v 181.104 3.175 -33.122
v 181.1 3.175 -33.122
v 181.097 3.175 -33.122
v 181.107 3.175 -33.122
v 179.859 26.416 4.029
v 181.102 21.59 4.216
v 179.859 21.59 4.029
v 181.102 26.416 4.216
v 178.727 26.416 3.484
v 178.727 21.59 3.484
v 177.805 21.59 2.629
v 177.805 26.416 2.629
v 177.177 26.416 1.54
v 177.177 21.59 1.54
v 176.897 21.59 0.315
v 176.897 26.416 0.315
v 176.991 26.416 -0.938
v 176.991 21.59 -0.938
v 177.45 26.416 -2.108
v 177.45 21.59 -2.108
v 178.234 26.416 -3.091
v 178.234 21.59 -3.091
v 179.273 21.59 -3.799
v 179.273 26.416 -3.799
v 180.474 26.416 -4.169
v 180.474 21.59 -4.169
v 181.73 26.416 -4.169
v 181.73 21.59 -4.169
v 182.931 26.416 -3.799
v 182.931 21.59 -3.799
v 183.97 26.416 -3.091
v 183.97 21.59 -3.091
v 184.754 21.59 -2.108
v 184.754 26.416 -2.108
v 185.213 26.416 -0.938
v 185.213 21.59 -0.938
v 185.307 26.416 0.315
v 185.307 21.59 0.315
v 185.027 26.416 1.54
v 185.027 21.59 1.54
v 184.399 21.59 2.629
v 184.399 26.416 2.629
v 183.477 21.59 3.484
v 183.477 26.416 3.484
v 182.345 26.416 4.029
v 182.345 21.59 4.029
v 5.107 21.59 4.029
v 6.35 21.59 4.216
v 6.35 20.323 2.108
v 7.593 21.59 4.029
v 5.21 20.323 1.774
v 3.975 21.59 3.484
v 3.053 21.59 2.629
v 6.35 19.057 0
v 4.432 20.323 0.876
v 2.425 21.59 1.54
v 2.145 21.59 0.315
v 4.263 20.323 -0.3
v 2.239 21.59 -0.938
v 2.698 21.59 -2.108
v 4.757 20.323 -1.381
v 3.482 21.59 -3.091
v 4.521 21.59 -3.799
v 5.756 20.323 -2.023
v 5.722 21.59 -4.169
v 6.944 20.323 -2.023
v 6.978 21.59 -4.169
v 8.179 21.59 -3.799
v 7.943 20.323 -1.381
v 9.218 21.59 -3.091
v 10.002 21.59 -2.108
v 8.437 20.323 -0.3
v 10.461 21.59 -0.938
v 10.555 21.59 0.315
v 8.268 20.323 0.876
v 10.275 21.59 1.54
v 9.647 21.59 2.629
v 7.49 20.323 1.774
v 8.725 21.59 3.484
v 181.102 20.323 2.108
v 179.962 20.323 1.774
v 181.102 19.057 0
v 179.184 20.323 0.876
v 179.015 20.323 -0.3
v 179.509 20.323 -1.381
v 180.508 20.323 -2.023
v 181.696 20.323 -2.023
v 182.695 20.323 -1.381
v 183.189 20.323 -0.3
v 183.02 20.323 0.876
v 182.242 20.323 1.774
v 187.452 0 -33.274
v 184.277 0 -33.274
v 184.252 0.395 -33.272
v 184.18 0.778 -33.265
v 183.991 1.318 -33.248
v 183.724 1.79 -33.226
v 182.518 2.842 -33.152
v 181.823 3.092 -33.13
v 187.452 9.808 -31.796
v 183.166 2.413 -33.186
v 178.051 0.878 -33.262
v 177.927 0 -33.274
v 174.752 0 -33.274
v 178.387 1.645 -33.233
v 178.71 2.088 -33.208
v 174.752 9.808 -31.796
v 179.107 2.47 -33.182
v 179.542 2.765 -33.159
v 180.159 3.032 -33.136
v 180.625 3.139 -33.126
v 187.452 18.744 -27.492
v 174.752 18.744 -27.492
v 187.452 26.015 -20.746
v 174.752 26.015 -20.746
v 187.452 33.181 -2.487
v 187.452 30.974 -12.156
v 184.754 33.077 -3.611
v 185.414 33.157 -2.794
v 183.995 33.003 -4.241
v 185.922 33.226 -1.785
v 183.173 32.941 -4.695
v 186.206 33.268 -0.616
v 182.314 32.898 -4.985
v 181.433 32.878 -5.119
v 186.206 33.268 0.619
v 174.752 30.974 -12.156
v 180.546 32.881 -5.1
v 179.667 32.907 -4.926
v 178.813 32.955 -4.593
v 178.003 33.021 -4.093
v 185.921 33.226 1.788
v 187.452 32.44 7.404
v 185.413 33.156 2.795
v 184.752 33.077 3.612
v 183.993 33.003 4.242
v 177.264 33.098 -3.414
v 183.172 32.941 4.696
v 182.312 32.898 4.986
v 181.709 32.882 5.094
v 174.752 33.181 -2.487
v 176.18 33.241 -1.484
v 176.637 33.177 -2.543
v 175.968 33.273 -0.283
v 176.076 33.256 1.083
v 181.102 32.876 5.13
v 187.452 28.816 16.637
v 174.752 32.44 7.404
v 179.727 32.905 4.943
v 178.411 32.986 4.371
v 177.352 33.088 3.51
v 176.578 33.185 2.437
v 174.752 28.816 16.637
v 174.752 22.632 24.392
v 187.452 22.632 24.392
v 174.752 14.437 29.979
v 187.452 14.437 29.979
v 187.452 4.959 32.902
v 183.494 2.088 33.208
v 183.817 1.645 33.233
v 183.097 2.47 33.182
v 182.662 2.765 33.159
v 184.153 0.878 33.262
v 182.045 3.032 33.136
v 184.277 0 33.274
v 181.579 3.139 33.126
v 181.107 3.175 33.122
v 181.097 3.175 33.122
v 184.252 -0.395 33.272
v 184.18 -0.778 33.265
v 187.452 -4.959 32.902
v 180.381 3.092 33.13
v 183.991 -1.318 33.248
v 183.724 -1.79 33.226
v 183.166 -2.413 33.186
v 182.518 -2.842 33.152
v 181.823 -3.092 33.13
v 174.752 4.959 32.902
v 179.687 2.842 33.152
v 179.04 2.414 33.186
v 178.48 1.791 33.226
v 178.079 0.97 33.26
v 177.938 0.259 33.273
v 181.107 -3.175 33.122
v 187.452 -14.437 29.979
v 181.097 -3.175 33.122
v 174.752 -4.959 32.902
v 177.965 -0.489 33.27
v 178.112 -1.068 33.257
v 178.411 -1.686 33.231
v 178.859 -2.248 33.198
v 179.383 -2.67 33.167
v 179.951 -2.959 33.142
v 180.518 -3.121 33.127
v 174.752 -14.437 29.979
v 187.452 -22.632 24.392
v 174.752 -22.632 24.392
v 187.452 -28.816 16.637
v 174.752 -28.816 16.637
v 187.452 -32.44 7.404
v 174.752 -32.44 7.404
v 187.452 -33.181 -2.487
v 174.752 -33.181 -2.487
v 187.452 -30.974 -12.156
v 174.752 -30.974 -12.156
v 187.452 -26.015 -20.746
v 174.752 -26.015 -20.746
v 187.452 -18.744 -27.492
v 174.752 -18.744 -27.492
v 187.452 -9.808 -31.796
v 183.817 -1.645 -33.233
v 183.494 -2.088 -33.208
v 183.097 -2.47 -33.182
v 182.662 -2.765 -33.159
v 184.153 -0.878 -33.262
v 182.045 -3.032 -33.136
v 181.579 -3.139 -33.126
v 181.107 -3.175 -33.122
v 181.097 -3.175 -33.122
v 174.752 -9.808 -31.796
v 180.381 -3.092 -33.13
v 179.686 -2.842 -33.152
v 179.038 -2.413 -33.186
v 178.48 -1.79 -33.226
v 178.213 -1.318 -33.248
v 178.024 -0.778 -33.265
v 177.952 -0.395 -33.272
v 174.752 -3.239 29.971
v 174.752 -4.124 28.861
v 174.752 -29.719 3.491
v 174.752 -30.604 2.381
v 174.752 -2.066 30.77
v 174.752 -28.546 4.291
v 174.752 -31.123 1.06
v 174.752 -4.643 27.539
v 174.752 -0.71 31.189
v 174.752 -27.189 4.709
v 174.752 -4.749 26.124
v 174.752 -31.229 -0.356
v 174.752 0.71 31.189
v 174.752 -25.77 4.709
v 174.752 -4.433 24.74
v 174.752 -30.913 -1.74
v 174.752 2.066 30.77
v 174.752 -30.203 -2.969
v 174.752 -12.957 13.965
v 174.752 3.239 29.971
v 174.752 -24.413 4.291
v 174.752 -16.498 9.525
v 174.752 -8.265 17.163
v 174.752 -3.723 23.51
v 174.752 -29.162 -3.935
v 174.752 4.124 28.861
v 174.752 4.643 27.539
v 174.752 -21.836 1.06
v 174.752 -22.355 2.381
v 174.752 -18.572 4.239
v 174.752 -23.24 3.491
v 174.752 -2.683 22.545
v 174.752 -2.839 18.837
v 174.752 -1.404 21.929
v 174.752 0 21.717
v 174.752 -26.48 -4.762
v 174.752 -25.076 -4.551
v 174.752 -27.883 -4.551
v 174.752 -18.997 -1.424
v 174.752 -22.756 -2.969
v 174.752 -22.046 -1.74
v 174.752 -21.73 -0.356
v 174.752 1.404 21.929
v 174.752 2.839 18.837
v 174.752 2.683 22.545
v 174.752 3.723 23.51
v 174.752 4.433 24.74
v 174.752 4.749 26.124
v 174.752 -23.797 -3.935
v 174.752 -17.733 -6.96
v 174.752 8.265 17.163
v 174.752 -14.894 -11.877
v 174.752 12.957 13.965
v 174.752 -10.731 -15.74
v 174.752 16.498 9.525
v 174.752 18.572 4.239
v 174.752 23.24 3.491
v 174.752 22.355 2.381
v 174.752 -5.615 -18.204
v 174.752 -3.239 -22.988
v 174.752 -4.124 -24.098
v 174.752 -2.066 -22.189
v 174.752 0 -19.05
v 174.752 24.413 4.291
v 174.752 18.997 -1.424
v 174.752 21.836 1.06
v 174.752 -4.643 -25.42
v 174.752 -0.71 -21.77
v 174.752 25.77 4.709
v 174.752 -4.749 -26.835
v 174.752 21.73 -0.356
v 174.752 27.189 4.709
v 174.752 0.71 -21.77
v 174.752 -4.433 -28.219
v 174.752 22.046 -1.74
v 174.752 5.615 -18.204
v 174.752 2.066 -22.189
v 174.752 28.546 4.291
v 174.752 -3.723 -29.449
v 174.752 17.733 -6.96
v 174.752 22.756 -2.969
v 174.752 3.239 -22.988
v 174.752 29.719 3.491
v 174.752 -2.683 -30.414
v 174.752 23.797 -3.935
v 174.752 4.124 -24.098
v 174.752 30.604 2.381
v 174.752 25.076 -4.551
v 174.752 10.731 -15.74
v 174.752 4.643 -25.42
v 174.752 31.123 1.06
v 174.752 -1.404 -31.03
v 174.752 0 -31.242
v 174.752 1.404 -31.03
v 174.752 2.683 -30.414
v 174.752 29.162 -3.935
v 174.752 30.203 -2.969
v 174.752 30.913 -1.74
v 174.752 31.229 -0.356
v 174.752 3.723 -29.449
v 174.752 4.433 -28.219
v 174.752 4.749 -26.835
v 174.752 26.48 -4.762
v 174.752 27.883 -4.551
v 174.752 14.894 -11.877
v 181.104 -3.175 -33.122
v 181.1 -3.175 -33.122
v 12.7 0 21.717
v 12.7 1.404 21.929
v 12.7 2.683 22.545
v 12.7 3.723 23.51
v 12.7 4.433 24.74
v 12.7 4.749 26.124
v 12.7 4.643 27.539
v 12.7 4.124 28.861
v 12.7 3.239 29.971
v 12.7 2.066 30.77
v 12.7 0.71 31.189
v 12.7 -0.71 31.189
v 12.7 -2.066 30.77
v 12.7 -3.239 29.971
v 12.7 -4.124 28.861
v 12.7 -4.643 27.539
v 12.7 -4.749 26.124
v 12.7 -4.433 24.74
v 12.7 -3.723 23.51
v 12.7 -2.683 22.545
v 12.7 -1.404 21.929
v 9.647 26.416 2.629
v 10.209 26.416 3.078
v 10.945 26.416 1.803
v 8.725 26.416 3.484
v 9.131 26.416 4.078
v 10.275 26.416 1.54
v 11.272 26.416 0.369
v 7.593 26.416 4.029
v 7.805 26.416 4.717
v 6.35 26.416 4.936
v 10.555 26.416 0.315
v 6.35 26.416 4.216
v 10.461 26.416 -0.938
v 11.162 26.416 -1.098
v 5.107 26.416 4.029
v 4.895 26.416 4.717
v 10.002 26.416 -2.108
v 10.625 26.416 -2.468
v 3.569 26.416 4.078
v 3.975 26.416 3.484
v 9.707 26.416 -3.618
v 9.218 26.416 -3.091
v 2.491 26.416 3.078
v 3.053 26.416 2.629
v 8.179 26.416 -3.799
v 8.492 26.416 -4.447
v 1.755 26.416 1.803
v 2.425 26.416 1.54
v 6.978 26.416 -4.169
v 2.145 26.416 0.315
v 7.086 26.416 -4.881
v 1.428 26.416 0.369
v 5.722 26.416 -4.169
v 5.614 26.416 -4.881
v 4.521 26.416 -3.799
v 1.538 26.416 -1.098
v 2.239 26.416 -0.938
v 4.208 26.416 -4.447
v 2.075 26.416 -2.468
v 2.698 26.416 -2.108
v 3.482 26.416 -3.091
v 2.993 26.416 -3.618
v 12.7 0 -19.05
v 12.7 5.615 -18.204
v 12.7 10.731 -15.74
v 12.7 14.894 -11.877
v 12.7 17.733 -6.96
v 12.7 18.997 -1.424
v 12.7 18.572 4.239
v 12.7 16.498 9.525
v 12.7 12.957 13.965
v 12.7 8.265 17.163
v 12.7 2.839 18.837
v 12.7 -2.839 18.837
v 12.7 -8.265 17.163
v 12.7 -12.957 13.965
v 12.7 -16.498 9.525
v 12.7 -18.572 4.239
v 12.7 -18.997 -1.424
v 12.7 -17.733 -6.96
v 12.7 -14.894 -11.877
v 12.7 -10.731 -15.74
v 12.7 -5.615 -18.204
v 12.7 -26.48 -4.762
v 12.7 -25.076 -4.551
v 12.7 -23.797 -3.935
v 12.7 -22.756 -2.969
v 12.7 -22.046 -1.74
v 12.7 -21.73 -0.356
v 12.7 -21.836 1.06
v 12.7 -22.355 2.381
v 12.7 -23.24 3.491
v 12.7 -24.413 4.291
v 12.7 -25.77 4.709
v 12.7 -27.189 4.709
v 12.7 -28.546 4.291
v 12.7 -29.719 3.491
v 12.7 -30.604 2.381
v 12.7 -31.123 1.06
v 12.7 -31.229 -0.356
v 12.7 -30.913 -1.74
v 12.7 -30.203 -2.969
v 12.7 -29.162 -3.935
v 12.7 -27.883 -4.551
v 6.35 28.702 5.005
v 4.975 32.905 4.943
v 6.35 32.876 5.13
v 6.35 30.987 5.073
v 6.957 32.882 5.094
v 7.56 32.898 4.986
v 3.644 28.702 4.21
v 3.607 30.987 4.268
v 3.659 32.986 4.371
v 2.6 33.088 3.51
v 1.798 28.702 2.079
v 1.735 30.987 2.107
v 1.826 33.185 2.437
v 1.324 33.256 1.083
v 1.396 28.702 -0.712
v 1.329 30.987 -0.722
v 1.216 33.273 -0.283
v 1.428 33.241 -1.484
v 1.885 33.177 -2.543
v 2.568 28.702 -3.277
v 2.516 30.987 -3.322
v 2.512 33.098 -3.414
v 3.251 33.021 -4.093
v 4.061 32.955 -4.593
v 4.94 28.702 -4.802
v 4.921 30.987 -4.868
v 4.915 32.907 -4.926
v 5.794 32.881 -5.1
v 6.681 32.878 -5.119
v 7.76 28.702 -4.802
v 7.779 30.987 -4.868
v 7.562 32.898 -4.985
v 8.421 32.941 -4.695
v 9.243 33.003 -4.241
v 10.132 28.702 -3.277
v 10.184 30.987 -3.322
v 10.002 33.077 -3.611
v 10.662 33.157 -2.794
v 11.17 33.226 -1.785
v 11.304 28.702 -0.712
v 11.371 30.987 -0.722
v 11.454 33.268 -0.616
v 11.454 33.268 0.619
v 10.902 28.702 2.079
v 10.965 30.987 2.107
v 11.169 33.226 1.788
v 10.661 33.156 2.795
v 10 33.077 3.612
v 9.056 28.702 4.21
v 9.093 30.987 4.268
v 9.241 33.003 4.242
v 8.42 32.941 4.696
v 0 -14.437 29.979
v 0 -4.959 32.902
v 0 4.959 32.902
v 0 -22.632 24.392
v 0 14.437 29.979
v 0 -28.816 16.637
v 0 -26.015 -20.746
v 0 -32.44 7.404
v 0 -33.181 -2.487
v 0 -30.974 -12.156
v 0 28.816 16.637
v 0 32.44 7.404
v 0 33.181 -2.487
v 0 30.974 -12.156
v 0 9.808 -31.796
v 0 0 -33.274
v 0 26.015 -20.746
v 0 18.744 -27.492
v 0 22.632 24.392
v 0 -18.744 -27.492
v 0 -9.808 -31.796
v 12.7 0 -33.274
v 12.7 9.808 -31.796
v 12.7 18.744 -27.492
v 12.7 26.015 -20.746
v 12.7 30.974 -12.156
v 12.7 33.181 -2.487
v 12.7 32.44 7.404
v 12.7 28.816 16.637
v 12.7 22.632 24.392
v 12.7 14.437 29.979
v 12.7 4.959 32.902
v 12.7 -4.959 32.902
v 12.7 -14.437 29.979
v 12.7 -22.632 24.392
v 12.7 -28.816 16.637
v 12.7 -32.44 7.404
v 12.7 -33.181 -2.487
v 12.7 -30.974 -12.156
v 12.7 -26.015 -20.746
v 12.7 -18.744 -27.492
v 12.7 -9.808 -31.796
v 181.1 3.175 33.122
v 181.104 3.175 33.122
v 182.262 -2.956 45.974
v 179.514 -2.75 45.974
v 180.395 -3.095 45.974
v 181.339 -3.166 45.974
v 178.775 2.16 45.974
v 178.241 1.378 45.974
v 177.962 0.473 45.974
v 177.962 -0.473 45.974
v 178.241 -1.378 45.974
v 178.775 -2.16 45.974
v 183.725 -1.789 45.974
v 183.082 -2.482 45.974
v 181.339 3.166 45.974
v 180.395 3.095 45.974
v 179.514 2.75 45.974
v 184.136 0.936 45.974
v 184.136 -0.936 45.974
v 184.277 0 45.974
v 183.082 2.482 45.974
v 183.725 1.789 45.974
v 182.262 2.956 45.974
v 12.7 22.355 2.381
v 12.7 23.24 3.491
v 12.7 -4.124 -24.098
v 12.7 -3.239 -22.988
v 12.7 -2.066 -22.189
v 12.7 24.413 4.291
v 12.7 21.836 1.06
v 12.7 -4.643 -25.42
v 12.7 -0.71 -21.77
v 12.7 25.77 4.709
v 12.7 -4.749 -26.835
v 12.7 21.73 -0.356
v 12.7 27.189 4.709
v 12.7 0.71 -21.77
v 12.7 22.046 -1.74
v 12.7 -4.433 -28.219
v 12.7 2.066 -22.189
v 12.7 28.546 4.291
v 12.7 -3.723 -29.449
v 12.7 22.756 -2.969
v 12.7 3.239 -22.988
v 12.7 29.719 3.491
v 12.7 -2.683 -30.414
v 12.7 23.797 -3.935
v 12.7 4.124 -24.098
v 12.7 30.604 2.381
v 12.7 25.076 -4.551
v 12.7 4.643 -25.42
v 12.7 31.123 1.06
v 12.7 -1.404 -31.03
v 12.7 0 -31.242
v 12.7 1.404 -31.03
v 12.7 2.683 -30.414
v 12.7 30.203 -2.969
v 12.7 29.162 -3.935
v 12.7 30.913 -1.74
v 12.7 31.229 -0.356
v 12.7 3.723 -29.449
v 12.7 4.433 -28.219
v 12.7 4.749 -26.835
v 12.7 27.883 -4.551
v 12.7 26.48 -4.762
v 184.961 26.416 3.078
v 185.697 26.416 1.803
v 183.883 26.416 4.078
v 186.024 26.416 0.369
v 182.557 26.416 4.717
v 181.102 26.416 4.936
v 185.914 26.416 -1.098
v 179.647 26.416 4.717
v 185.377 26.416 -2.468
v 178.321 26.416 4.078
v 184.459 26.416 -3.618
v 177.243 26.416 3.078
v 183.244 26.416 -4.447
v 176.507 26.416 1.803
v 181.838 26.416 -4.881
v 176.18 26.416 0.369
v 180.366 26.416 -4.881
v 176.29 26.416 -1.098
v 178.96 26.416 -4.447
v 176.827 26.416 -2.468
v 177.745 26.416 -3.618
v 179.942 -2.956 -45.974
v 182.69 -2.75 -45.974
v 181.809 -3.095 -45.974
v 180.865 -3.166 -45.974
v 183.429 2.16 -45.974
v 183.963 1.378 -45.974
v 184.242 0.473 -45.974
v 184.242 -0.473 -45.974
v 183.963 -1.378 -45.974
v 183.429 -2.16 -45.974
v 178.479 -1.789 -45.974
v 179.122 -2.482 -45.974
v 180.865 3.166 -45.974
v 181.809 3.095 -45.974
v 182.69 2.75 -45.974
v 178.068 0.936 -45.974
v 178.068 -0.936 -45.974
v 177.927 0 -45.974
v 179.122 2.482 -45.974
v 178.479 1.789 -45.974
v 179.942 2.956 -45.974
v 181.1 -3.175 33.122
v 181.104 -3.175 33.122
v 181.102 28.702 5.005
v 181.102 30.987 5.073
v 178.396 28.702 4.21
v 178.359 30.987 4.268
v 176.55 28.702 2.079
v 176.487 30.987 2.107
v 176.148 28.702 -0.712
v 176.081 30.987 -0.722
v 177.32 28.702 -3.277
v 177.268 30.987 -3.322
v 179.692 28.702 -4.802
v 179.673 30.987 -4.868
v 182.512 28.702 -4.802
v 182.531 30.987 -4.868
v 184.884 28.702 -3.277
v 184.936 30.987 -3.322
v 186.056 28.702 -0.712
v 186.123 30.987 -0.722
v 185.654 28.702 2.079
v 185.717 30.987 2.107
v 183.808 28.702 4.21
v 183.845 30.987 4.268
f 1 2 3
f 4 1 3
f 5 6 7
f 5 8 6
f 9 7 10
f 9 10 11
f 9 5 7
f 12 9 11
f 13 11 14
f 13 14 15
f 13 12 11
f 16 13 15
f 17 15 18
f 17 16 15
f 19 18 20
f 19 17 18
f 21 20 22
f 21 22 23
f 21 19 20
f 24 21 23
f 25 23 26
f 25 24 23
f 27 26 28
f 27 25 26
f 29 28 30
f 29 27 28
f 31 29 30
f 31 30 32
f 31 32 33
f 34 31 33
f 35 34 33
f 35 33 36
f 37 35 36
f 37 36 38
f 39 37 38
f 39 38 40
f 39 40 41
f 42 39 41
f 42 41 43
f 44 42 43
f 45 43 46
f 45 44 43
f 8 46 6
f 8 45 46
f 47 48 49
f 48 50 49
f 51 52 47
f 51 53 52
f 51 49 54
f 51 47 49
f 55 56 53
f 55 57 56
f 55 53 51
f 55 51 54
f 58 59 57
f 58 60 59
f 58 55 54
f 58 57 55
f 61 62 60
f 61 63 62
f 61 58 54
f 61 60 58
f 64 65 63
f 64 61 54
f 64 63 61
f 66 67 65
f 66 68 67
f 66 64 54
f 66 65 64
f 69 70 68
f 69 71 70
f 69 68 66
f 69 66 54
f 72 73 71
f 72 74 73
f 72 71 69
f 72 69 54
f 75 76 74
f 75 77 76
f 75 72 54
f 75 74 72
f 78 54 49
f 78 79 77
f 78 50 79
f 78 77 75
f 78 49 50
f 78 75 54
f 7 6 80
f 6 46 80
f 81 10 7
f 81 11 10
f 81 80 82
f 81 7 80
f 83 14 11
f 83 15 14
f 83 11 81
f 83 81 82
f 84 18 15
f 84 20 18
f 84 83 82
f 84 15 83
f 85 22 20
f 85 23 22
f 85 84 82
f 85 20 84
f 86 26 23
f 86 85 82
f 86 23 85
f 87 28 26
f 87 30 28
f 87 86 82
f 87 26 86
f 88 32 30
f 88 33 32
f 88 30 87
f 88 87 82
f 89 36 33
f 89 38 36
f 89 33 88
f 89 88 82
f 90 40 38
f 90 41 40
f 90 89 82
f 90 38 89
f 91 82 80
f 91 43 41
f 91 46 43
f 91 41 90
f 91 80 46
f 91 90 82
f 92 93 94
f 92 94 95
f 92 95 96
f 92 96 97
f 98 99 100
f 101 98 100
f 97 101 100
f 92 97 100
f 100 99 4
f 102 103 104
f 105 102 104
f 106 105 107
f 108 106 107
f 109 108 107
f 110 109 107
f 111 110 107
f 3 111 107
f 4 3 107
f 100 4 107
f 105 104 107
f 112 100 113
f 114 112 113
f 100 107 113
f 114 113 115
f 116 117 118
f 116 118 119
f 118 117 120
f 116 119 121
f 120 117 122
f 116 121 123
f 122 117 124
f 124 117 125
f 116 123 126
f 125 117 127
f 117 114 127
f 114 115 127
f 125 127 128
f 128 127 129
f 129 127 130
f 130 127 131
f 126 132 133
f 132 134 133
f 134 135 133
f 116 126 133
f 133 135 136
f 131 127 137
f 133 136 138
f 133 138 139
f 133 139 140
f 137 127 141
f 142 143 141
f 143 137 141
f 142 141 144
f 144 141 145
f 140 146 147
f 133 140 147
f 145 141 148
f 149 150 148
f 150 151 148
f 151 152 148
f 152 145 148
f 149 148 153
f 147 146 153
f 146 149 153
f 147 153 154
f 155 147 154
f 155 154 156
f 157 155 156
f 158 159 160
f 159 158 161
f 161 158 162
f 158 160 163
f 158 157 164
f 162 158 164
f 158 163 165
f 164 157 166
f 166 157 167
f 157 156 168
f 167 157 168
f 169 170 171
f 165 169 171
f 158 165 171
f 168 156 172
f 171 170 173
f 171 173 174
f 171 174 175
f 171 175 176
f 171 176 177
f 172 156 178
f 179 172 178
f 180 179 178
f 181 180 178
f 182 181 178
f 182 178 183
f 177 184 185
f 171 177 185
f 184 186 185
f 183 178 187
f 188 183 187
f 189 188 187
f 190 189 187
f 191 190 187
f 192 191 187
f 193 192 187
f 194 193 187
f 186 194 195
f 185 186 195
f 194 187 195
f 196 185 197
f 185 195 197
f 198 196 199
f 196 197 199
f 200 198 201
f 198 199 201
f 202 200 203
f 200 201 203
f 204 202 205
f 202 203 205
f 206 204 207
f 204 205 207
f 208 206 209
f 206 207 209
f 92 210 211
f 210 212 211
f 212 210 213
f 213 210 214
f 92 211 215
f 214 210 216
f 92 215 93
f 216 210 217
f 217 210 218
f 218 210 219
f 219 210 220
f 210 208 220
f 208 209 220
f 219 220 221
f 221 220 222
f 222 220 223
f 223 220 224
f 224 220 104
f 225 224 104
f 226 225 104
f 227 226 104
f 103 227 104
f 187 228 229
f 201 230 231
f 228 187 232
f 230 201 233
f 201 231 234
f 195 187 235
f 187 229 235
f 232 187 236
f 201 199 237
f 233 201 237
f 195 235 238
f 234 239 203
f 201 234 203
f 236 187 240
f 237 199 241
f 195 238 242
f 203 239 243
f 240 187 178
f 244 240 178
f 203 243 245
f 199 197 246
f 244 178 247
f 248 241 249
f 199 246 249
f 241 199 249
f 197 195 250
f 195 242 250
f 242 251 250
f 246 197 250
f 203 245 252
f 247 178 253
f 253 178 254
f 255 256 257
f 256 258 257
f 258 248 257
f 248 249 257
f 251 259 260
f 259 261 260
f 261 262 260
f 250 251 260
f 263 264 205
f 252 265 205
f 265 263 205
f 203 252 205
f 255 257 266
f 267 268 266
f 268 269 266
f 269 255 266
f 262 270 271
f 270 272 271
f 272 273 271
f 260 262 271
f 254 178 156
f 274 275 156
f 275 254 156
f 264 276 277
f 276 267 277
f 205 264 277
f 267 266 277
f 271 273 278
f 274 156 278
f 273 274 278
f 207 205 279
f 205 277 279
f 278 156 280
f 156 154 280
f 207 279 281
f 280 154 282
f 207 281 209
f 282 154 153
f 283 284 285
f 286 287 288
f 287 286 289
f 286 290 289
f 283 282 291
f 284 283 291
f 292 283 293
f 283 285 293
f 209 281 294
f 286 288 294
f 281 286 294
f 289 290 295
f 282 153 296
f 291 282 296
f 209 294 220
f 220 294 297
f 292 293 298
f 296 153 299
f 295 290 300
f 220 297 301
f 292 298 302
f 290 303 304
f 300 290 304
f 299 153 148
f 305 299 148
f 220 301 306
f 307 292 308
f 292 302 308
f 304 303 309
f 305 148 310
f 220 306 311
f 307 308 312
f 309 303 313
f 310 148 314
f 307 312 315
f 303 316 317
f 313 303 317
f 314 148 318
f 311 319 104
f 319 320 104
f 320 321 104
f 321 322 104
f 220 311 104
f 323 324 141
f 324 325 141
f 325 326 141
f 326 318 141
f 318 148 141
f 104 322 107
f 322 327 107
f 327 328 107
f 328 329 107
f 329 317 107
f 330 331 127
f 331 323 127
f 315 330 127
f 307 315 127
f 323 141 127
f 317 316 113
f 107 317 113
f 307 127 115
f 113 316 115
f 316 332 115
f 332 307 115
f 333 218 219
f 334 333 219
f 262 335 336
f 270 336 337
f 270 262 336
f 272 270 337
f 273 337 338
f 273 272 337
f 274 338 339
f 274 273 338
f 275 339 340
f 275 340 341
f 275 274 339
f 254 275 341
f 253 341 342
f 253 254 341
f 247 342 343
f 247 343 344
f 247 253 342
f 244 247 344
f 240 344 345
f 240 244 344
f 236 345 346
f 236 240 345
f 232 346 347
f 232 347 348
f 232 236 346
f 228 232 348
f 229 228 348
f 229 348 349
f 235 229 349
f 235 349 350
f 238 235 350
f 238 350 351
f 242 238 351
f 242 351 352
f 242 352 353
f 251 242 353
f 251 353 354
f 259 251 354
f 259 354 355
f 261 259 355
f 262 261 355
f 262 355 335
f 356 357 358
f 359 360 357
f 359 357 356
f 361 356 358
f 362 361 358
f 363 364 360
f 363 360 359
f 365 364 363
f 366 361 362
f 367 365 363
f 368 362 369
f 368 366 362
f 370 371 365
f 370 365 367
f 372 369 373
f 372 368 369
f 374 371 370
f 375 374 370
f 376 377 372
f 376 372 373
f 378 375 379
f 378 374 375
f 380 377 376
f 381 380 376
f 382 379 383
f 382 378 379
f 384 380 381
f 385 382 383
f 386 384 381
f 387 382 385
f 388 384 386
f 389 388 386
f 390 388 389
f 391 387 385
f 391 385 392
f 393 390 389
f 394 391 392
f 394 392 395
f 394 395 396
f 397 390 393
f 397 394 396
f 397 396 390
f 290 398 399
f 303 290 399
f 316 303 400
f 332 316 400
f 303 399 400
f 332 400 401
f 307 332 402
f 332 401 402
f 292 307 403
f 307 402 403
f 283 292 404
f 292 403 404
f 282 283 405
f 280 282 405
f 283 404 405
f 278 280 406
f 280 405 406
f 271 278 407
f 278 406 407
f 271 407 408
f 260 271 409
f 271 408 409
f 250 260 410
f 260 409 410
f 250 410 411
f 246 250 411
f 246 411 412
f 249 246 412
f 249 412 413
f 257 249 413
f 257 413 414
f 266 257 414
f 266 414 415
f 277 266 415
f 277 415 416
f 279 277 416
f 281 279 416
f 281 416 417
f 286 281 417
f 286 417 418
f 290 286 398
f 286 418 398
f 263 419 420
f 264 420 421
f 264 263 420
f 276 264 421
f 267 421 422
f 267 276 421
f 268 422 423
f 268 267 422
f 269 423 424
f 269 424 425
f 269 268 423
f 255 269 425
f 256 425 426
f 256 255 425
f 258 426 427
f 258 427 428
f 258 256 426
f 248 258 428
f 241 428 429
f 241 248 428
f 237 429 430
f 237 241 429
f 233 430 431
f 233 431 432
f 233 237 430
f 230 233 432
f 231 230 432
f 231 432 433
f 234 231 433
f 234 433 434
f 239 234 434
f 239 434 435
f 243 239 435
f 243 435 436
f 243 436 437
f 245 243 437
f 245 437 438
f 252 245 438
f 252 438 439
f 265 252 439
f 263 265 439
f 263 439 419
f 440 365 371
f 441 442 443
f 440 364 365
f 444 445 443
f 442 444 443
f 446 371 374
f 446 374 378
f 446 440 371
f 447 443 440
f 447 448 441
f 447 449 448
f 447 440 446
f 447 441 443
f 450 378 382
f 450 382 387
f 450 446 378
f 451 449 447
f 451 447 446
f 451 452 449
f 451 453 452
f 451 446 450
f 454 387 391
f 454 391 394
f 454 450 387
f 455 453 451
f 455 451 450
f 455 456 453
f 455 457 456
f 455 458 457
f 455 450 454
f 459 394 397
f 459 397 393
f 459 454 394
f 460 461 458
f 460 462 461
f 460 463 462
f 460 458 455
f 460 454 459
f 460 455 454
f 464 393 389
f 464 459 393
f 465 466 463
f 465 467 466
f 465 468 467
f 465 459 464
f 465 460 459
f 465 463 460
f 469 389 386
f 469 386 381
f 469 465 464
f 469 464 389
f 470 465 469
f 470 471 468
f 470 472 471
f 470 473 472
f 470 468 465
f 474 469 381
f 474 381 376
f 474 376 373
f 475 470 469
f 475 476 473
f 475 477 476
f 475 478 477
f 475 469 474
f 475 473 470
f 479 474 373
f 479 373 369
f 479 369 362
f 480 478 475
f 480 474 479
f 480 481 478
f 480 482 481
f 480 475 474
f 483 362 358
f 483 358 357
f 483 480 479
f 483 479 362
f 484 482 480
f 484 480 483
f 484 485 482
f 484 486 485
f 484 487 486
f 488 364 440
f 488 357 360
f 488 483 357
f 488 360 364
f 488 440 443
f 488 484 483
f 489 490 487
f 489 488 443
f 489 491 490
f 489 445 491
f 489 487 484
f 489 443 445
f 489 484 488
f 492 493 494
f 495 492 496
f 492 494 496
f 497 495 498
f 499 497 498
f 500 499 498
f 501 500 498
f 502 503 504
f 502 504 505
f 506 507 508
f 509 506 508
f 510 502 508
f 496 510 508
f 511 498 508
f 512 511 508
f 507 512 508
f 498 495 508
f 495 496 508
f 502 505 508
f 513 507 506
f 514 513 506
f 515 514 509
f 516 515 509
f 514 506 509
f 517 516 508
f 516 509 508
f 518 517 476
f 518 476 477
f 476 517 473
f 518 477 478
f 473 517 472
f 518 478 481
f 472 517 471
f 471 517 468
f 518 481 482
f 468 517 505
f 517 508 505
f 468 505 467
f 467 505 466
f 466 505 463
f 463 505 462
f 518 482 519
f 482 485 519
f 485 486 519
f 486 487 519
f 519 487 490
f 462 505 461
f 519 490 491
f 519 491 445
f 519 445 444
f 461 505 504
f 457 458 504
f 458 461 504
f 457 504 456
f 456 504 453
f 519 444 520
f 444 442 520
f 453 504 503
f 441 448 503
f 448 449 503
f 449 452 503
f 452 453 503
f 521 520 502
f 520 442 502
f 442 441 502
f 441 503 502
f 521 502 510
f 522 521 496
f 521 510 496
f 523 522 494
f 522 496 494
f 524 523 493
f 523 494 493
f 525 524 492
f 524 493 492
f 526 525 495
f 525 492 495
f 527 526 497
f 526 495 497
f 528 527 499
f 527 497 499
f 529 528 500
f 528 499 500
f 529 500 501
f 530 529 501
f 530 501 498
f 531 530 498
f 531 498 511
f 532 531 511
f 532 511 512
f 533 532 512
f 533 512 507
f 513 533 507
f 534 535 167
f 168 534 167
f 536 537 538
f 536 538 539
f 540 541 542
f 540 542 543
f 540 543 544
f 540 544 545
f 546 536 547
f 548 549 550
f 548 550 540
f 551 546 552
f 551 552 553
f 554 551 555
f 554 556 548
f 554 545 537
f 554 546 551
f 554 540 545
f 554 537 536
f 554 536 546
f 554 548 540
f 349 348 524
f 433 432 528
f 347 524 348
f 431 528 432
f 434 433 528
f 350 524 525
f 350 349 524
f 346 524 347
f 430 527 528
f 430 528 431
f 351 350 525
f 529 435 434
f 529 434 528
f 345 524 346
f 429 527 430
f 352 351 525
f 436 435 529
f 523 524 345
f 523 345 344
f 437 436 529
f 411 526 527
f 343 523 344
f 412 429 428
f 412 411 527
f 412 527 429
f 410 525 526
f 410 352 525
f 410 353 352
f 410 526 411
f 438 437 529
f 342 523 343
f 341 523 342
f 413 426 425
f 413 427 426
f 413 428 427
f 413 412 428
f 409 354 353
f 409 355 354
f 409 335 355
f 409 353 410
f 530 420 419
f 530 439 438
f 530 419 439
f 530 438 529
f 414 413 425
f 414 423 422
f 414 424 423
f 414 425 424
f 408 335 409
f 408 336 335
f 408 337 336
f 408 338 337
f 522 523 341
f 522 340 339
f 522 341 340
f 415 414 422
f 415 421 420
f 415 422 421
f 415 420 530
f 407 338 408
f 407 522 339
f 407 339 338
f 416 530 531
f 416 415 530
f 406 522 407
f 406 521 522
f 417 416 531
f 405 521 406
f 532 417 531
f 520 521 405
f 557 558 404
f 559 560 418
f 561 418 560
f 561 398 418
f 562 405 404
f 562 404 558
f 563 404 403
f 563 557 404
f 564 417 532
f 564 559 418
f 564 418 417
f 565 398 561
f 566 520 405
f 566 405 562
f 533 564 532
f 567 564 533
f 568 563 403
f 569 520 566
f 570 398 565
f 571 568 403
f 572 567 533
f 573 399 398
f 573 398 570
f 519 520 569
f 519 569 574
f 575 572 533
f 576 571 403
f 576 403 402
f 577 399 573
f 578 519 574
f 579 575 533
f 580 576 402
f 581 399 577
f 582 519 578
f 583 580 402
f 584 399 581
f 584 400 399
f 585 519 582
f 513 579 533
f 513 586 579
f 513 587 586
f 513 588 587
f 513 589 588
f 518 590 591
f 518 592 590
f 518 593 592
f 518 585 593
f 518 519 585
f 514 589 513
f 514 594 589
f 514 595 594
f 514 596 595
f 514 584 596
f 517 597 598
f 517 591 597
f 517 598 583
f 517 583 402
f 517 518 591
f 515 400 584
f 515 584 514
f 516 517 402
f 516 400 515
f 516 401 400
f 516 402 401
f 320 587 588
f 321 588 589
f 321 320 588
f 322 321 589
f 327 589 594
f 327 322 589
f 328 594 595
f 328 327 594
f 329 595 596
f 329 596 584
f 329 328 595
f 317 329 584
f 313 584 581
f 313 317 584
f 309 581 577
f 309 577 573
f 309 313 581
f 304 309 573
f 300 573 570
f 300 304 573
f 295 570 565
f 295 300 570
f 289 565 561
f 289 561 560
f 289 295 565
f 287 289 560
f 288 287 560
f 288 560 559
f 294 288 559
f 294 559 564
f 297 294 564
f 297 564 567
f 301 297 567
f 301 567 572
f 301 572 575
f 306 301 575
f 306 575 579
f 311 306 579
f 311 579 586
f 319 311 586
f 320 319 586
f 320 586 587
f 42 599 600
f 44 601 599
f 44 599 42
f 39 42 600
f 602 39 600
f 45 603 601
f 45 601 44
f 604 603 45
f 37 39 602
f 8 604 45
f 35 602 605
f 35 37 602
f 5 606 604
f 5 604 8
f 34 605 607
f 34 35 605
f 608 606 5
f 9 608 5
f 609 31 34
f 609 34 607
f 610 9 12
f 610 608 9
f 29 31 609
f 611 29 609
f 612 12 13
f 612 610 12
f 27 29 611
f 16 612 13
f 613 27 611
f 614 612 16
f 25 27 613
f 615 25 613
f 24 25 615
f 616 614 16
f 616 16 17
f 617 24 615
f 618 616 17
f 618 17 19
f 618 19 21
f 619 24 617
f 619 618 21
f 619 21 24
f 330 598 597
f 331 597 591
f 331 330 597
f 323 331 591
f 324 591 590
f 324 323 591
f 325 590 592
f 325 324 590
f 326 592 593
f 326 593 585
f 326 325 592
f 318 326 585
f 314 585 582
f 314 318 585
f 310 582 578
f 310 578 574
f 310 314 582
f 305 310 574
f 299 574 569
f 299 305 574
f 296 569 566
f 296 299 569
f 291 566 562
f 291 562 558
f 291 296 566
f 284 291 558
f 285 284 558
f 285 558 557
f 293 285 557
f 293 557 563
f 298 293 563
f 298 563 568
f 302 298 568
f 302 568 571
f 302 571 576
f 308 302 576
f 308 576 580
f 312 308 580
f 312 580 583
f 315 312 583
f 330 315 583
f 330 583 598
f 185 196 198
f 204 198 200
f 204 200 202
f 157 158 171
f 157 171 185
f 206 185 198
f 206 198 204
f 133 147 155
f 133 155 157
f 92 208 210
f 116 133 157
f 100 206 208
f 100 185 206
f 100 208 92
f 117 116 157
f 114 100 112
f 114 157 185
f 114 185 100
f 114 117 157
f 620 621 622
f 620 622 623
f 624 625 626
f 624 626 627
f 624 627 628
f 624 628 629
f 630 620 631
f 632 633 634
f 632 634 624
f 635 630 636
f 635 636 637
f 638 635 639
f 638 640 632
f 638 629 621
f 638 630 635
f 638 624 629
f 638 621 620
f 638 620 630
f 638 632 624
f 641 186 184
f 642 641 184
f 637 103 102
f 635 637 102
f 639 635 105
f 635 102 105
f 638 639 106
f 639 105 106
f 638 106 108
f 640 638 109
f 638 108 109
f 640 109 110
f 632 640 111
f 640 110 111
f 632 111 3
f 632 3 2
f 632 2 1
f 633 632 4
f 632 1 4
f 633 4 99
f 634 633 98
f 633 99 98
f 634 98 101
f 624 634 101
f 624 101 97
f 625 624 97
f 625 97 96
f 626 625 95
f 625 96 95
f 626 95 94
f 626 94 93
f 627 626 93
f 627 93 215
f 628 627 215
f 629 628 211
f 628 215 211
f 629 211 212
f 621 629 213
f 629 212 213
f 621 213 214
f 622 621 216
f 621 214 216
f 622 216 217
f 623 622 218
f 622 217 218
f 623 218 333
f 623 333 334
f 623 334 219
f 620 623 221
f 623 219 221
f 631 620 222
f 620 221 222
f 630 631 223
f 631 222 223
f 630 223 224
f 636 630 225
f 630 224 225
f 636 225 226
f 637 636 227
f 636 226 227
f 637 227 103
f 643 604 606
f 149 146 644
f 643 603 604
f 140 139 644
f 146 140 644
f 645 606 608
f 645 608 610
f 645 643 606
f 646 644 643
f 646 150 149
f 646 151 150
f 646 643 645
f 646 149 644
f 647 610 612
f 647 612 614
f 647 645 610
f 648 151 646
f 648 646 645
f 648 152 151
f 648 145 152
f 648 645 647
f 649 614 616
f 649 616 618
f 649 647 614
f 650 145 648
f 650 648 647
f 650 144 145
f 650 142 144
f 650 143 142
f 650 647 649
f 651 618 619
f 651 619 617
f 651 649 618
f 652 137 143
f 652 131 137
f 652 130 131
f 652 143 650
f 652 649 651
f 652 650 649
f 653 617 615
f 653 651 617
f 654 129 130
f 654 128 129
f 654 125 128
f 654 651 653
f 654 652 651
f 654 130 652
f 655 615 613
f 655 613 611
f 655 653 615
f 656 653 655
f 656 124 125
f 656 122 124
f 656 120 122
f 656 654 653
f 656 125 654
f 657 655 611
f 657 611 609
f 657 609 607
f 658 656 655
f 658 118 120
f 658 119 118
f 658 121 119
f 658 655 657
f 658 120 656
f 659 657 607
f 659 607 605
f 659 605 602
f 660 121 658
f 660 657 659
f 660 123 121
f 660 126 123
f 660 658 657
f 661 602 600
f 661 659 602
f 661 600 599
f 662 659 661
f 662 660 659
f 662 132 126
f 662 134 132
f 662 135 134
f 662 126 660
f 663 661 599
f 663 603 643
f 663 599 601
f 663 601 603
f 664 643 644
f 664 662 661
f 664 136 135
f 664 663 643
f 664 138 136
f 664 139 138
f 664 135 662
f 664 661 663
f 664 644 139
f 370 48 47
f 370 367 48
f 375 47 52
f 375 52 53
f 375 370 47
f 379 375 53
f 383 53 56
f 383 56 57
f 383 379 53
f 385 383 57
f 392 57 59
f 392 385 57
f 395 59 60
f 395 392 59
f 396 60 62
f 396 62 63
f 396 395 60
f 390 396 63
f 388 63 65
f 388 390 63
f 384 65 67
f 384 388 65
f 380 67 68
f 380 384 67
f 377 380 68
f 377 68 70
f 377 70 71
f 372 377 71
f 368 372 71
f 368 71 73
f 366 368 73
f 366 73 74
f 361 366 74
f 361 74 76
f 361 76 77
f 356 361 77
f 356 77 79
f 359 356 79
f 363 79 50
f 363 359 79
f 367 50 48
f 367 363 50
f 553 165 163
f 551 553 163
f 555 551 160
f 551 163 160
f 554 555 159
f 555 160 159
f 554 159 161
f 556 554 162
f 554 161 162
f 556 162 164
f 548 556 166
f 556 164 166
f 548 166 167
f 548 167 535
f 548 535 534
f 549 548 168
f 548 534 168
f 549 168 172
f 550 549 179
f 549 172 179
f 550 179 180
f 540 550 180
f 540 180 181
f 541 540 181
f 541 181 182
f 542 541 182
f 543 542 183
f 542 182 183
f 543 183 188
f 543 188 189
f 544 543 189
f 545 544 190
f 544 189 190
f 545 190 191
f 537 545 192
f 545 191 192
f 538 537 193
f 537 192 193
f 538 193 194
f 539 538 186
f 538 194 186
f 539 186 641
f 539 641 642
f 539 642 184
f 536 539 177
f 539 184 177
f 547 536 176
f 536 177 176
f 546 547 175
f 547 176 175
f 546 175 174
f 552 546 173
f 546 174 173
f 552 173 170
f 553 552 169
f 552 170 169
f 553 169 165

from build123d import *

# Parameters (mm, degrees)
SKETCH1_R                         = 33.274
BOSS_EXTRUDE1_DEPTH               = 12.7
SKETCH2_R                         = 19.05
BOSS_EXTRUDE2_DEPTH               = 162.052
SKETCH3_R                         = 33.274
BOSS_EXTRUDE3_DEPTH               = 12.7
SKETCH4_R                         = 4.7625
BOSS_EXTRUDE4_DEPTH               = 174.752
BOSS_EXTRUDE5_START               = -0.151825
SKETCH5_R                         = 3.175
BOSS_EXTRUDE5_DEPTH               = 12.851825
BOSS_EXTRUDE6_START               = -0.151825
SKETCH6_R                         = 3.175
BOSS_EXTRUDE6_DEPTH               = 12.851825
F_1_8_NPT_TAPPED_HOLE1_AT_2_COUNT = 2
F_1_8_NPT_TAPPED_HOLE1_AT_2_PITCH = 174.752


with BuildPart() as part:
    # Sketch1 → Boss-Extrude1 (new body)
    with BuildSketch(Plane(origin=(0, 0, 0), x_dir=(0, 0, -1), z_dir=(1, 0, 0))):
        Circle(SKETCH1_R)
    extrude(amount=BOSS_EXTRUDE1_DEPTH)

    # Sketch2 → Boss-Extrude2 (add)
    with BuildSketch(Plane(origin=(12.7, 0, 0), x_dir=(0, 0, -1), z_dir=(1, 0, 0))):
        Circle(SKETCH2_R)
    extrude(amount=BOSS_EXTRUDE2_DEPTH)

    # Sketch3 → Boss-Extrude3 (add)
    with BuildSketch(Plane(origin=(174.752, 0, 0), x_dir=(0, 0, -1), z_dir=(1, 0, 0))):
        Circle(SKETCH3_R)
    extrude(amount=BOSS_EXTRUDE3_DEPTH)

    # Sketch4 → Boss-Extrude4 (add)
    with BuildSketch(Plane(origin=(187.452, 0, 0), x_dir=(0, 0, -1), z_dir=(1, 0, 0))):
        with Locations((26.4795, 0)):
            Circle(SKETCH4_R)
        with Locations((0, -26.4795)):
            Circle(SKETCH4_R)
        with Locations((-26.4795, 0)):
            Circle(SKETCH4_R)
        with Locations((0, 26.4795)):
            Circle(SKETCH4_R)
    extrude(amount=-BOSS_EXTRUDE4_DEPTH)

    # Sketch5 → Boss-Extrude5 (add)
    with BuildSketch(Plane(origin=(0, 0, -33.274), x_dir=(-1, 0, 0), z_dir=(0, 0, -1)).offset(BOSS_EXTRUDE5_START)):
        with Locations((-181.102, 0)):
            Circle(SKETCH5_R)
    extrude(amount=BOSS_EXTRUDE5_DEPTH)

    # Sketch6 → Boss-Extrude6 (add)
    with BuildSketch(Plane.XY.offset(33.274).offset(BOSS_EXTRUDE6_START)):
        with Locations((181.102, 0)):
            Circle(SKETCH6_R)
    extrude(amount=BOSS_EXTRUDE6_DEPTH)

    # Sketch8 → 1/8 NPT Tapped Hole1 (revolve, cut)
    with BuildSketch(Plane(origin=(181.102, 33.274, 0), x_dir=(0, 0, 1), z_dir=(1, 0, 0))):
        Polygon((0, 0), (0, 14.217468714), (4.2164, 11.684), (4.2164, 6.858), (4.936181096, 6.858), (5.1415188, 0), align=None)
    f_1_8_npt_tapped_hole1 = revolve(axis=Axis((181.102, 39.624, 0), (0, -1, 0)), mode=Mode.SUBTRACT)

    # 1/8 NPT Tapped Hole1 at 2: 1/8 NPT Tapped Hole1 ×2
    with Locations(*[(-i * F_1_8_NPT_TAPPED_HOLE1_AT_2_PITCH, 0, 0) for i in range(1, F_1_8_NPT_TAPPED_HOLE1_AT_2_COUNT)]):
        add(f_1_8_npt_tapped_hole1, mode=Mode.SUBTRACT)


solid = part.part
